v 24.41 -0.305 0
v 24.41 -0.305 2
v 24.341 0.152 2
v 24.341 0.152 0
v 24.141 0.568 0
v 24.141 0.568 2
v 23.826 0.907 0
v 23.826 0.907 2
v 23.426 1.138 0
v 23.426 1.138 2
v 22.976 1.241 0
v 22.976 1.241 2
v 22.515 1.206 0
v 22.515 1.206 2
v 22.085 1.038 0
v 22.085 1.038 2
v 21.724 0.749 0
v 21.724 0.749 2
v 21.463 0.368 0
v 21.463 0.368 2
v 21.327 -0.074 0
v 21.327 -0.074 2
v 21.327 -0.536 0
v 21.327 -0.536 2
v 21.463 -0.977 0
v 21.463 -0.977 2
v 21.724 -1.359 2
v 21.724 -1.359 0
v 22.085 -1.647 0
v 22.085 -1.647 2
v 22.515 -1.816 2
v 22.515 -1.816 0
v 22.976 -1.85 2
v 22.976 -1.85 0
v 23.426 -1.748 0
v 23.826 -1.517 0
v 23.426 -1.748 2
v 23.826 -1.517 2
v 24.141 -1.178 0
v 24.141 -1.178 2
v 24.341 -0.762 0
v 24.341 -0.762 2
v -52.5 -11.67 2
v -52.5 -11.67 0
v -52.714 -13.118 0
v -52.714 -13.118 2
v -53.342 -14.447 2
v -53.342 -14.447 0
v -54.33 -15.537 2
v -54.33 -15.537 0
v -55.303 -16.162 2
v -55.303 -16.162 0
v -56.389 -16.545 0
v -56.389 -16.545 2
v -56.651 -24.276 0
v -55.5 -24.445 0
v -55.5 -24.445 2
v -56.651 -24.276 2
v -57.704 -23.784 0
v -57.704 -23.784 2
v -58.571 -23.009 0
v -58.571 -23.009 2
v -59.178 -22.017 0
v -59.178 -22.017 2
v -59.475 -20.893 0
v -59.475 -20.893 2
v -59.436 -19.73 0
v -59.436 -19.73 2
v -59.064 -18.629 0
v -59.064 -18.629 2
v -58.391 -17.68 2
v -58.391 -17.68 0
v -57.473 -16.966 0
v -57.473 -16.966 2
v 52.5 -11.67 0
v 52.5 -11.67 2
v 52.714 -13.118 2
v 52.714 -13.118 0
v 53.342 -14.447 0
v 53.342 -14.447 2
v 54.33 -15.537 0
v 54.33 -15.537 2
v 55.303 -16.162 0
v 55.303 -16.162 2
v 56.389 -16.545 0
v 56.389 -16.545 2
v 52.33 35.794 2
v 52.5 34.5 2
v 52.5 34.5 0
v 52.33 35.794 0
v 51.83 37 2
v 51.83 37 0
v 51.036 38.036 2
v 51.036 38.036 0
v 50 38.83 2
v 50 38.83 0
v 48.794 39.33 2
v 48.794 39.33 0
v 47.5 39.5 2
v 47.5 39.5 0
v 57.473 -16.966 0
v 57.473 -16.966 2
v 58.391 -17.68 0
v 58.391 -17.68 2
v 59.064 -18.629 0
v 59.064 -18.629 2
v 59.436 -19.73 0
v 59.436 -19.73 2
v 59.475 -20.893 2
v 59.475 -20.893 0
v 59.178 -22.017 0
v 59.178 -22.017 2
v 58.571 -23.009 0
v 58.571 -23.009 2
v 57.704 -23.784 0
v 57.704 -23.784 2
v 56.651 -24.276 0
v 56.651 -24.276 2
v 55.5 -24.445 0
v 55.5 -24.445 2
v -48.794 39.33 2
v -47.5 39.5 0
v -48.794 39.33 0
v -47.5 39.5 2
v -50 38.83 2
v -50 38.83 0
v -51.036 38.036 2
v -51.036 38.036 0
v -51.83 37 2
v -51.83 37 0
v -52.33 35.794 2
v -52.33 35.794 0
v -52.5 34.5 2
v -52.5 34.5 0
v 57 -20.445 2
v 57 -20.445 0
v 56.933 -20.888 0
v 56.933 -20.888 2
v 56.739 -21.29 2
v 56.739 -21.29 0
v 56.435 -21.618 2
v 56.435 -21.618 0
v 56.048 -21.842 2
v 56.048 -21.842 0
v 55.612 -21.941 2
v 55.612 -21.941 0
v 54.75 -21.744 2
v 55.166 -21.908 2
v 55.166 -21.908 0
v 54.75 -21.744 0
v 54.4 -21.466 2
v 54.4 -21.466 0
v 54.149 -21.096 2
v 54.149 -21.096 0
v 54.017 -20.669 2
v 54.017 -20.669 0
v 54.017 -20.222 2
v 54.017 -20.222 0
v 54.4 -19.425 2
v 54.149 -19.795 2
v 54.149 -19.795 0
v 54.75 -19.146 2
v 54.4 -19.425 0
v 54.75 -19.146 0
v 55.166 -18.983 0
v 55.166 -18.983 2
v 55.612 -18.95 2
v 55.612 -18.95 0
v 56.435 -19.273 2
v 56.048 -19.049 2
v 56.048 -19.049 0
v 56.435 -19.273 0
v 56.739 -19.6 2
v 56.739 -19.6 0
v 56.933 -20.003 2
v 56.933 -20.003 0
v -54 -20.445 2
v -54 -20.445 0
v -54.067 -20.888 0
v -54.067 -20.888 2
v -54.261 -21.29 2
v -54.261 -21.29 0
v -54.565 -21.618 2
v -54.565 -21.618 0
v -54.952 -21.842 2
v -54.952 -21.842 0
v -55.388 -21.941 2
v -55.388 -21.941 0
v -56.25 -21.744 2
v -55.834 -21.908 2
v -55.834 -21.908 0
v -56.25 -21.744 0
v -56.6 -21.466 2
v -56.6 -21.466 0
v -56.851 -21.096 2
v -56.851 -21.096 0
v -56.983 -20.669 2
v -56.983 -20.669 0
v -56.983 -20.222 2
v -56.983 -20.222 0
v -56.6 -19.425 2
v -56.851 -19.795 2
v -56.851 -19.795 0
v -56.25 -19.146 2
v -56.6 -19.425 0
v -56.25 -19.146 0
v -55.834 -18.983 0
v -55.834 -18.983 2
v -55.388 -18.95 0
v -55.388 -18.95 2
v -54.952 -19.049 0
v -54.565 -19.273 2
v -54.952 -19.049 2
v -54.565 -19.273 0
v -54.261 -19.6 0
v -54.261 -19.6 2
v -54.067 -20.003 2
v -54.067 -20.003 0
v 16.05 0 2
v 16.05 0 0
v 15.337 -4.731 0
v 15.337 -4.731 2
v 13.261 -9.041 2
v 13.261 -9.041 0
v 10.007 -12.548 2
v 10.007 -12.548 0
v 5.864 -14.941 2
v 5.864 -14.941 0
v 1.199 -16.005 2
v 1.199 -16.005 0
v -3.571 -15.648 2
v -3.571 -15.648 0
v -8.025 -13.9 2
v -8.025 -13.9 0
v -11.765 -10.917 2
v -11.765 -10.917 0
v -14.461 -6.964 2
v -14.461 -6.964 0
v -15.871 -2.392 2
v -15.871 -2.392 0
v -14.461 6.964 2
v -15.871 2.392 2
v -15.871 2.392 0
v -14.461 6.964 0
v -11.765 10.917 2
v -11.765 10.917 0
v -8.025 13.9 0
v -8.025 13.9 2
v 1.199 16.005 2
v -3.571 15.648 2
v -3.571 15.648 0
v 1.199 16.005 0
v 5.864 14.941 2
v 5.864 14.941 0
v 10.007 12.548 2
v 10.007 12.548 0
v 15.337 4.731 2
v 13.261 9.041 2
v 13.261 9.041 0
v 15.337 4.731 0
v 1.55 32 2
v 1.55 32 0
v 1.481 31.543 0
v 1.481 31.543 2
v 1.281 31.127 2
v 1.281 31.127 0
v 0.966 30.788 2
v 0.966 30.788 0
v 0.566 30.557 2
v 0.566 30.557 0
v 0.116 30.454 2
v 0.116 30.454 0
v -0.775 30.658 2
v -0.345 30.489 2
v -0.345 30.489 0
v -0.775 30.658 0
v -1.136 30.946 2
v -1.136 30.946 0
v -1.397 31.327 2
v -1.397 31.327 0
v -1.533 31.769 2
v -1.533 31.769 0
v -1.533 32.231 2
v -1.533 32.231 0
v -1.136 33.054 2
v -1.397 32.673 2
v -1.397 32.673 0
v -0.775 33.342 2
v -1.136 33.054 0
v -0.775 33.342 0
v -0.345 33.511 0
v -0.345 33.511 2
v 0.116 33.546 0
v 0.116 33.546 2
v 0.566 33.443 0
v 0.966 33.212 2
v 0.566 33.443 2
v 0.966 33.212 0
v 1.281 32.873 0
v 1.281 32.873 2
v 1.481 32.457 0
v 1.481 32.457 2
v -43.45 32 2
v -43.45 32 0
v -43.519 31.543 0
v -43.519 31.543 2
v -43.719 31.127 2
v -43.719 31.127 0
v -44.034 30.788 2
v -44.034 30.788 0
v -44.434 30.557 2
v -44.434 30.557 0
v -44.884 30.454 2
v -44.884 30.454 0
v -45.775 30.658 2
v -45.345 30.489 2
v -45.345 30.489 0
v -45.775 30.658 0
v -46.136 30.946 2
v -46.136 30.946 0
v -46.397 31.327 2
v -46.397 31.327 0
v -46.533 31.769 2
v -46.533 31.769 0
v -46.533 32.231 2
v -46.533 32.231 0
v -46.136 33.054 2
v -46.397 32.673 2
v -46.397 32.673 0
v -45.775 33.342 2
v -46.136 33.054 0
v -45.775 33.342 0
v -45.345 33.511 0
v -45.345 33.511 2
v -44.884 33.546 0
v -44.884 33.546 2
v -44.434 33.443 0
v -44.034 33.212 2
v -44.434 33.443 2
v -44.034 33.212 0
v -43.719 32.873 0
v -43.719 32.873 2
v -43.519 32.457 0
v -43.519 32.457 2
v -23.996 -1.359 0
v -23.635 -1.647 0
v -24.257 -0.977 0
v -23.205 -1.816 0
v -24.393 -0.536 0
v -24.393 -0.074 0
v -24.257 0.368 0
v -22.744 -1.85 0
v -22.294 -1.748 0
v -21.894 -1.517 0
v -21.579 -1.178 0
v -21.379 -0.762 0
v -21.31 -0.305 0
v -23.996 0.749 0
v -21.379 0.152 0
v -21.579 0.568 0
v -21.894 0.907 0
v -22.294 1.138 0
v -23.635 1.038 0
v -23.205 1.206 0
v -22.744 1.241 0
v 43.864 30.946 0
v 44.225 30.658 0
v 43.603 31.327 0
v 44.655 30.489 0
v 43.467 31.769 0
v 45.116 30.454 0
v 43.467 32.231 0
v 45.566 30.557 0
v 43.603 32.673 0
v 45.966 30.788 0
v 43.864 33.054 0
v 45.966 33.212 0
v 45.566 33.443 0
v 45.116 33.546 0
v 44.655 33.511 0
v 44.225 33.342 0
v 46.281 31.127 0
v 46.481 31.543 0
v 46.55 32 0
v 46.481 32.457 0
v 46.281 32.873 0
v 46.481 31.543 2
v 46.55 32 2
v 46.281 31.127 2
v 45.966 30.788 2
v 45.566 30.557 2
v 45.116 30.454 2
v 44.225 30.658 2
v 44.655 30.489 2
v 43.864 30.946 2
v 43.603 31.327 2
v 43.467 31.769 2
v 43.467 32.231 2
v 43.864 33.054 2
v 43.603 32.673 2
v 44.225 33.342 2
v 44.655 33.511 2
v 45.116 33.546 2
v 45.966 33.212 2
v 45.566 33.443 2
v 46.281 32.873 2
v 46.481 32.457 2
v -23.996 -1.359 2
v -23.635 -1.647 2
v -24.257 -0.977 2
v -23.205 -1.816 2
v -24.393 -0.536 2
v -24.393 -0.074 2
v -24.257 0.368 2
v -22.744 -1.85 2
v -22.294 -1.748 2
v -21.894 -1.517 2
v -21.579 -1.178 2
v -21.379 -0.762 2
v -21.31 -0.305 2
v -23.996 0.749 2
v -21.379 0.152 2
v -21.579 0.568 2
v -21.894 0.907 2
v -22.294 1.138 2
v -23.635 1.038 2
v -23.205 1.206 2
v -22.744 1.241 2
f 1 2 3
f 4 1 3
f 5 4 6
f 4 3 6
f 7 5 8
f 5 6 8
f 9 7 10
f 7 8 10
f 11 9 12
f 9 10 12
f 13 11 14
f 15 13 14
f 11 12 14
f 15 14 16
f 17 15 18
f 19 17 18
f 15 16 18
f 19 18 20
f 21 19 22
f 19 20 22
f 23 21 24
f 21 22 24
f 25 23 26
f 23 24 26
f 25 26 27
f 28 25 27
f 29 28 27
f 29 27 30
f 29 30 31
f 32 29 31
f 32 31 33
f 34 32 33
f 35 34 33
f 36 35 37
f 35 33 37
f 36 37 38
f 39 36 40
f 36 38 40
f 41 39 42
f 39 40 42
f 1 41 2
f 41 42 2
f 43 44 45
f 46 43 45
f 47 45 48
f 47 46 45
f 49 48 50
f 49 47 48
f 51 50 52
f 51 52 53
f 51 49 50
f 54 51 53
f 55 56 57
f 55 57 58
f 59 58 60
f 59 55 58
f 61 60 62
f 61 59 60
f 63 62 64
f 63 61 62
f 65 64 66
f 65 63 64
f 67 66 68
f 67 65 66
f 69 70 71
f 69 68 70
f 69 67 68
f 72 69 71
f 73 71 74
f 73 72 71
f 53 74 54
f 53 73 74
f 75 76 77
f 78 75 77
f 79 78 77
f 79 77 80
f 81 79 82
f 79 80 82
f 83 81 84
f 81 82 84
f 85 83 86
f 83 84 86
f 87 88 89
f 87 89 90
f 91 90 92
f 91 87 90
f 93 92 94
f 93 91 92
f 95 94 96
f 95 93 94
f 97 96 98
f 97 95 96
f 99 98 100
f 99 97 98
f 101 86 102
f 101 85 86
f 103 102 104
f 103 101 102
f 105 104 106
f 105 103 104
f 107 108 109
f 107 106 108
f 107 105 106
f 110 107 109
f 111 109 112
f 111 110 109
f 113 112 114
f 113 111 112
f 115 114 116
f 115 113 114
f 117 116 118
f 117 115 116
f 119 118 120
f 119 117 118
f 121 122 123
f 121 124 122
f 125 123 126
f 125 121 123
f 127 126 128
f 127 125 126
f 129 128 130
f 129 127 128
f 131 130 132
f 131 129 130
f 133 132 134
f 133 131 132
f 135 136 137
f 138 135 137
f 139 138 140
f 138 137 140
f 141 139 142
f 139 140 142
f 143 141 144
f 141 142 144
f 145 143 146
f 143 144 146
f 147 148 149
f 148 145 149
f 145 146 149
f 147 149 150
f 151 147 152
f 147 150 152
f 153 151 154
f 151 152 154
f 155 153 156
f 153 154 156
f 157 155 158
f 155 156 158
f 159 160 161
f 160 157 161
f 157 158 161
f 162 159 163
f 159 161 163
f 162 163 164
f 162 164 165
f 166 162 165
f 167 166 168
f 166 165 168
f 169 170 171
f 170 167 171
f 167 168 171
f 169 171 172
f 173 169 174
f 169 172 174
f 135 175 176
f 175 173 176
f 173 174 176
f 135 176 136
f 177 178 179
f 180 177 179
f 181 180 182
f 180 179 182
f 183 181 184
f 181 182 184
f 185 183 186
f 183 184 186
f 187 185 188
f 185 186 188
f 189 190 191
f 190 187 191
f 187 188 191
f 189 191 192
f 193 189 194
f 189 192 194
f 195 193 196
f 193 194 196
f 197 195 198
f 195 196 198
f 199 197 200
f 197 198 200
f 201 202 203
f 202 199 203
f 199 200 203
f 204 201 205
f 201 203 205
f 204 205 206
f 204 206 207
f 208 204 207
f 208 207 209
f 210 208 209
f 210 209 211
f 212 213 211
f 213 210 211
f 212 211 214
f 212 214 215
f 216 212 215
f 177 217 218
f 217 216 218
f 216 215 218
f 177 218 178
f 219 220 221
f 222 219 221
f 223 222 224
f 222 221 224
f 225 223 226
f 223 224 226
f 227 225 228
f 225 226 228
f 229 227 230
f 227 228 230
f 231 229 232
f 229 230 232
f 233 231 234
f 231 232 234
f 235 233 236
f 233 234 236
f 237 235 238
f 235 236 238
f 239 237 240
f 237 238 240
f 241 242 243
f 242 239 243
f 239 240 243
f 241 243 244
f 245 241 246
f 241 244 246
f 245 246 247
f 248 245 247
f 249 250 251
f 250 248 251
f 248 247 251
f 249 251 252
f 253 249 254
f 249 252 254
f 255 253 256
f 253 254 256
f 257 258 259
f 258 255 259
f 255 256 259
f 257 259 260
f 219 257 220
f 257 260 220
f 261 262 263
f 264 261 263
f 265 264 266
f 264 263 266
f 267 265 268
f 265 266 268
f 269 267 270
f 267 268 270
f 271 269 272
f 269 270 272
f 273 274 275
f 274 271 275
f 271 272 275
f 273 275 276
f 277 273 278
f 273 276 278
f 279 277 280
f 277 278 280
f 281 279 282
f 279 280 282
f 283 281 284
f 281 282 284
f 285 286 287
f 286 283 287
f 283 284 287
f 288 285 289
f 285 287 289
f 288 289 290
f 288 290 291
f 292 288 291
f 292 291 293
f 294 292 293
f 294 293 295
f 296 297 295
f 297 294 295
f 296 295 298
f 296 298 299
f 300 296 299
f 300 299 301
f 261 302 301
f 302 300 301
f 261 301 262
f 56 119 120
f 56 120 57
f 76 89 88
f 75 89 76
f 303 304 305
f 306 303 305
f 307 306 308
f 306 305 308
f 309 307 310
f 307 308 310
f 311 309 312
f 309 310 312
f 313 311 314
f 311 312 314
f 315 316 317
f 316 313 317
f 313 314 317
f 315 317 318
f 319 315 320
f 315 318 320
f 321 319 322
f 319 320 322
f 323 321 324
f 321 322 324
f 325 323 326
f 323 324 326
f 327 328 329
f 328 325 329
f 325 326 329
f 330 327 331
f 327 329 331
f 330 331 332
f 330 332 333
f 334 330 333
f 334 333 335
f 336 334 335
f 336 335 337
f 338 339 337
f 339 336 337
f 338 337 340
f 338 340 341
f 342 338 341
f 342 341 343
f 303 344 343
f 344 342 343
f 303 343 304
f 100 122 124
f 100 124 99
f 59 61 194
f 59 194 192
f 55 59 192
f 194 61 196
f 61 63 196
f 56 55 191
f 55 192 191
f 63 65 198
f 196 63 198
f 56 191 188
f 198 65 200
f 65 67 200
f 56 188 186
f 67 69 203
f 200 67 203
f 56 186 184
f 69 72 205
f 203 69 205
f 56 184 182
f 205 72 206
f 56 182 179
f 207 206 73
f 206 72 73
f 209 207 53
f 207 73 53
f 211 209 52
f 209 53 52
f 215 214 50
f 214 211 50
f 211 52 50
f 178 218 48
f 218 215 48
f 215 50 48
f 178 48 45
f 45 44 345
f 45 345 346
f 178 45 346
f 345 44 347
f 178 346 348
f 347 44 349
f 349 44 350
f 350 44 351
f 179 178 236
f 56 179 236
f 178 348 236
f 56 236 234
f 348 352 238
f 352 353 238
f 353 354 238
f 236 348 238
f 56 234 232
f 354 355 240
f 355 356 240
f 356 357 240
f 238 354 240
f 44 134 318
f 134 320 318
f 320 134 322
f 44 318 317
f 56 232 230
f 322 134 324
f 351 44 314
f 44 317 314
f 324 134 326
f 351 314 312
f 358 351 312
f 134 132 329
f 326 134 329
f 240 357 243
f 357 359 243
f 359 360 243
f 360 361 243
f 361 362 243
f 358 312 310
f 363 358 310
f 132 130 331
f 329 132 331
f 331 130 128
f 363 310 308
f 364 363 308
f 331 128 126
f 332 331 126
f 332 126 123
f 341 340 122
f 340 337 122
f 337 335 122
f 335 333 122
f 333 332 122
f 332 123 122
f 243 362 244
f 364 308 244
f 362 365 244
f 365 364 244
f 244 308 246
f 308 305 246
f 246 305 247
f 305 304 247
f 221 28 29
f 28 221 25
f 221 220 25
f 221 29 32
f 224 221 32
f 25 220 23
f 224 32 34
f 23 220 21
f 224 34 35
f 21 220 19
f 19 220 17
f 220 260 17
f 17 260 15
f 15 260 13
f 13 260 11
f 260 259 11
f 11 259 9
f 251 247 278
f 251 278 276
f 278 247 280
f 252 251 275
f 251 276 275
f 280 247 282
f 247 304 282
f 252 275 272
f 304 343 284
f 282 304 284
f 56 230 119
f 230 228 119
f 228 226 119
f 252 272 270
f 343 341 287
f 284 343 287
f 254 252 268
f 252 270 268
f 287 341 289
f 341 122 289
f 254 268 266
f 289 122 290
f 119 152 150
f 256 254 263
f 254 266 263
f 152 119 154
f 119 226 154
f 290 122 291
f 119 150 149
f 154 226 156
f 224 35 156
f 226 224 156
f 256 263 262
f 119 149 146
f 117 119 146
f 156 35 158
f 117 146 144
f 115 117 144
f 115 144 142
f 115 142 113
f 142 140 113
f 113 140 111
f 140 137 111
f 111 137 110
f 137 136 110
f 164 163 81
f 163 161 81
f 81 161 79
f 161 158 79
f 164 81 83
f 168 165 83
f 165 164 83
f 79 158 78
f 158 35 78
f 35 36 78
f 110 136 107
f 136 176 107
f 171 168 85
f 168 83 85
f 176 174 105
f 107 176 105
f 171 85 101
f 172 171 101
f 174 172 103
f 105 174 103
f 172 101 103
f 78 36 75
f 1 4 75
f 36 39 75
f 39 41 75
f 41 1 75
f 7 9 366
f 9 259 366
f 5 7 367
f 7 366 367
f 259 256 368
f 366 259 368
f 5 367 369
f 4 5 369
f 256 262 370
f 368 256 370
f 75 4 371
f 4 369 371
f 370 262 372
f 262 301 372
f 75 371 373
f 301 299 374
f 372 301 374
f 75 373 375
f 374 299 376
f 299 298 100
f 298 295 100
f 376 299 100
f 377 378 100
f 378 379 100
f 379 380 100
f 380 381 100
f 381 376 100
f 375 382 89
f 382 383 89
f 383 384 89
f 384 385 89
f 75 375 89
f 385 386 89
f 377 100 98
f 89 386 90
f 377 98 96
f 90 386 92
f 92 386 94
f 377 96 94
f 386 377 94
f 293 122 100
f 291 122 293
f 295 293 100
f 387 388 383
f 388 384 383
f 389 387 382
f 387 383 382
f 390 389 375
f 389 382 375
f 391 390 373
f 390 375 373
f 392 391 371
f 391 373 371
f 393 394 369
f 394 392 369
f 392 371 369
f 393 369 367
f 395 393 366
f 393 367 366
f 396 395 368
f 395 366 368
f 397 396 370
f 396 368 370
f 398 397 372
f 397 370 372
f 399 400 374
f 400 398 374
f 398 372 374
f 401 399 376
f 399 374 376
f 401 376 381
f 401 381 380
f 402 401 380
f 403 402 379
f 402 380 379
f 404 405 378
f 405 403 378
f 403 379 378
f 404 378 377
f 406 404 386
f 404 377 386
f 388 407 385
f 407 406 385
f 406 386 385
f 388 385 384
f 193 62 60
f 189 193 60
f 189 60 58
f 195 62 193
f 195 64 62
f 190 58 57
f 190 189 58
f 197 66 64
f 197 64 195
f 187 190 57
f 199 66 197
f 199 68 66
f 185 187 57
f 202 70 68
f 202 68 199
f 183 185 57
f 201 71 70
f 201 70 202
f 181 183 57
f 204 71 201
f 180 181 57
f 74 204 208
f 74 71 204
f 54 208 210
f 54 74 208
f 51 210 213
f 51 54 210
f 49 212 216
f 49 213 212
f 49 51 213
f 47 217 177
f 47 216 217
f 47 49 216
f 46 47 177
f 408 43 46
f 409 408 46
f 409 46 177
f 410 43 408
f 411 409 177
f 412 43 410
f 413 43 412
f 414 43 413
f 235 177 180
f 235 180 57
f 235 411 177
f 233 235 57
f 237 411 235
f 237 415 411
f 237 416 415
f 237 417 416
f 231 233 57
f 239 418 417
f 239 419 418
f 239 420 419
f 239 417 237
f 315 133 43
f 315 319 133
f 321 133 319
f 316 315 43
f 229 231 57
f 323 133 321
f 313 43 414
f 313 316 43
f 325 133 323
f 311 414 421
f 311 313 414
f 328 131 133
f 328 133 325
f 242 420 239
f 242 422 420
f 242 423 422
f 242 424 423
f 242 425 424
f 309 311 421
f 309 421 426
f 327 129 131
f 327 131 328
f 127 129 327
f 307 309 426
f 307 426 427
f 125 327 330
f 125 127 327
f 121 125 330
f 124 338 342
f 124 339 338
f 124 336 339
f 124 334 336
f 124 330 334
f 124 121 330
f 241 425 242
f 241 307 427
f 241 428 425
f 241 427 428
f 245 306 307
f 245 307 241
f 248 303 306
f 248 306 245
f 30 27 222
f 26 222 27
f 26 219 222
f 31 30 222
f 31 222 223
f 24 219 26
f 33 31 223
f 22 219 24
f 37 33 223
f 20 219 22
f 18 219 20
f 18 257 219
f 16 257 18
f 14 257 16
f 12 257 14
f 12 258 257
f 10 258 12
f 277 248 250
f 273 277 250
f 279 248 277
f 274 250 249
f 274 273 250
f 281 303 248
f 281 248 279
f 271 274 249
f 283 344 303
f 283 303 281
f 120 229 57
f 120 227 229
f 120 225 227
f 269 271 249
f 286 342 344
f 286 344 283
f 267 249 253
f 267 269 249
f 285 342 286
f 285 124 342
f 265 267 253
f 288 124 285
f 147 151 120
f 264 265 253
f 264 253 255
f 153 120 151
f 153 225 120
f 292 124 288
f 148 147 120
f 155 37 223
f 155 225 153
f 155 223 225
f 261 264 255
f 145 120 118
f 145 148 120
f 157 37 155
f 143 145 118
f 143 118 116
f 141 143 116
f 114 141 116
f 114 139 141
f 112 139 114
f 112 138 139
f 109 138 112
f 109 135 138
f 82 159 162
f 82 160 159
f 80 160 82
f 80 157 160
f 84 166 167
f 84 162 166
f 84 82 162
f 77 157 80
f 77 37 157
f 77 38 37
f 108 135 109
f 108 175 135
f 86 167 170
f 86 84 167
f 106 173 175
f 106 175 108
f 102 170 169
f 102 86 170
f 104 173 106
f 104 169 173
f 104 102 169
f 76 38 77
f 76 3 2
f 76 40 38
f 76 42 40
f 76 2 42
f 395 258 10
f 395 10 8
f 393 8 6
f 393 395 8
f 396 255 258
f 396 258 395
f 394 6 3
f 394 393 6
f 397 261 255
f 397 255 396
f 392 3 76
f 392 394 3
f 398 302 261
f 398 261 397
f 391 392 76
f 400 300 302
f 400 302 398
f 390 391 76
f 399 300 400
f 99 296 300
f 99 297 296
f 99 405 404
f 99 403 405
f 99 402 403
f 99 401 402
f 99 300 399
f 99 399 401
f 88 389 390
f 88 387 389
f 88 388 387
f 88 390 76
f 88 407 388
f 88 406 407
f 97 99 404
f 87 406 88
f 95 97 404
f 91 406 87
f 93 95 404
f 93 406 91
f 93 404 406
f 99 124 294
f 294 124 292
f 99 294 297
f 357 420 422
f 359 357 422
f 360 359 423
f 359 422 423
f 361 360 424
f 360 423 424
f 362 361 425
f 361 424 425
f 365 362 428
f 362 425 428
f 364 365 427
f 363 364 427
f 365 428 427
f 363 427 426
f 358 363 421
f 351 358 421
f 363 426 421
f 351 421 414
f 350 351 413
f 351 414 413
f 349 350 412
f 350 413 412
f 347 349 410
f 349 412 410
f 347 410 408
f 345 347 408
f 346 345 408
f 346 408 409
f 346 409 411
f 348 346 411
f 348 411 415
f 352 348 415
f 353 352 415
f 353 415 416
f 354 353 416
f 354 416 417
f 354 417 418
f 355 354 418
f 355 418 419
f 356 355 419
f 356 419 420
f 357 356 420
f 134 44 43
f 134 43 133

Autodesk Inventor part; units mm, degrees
ref_plane "YZ Plane" through (0, 0, 0) normal (1, 0, 0) x (0, 1, 0)
ref_plane "XZ Plane" through (0, 0, 0) normal (0, 1, 0) x (-1, 0, 0)
ref_plane "XY Plane" through (0, 0, 0) normal (0, 0, 1) x (1, 0, 0)
sketch "スケッチ1" plane through (0, 0, 0) normal (0, 0, 1) x (1, 0, 0)
  circle A0 centre (0, 0) radius 52.5 construction
  circle A1 centre (0, 0) radius 12.55 construction
  circle A2 centre (-12.3744, 12.3744) radius 2.05 construction
  circle A3 centre (-12.3744, -12.3744) radius 2.05 construction
  circle A4 centre (12.3744, -12.3744) radius 2.05 construction
  circle A5 centre (12.3744, 12.3744) radius 2.05 construction
  line L0 (0, 0) -> (-12.3744, 12.3744) construction
  line L1 (0, 0) -> (0, 12.55) construction
  circle A6 centre (0, 0) radius 23.5 construction
  line L2 (-52.5, 39.5) -> (52.5, 39.5)
  line L3 (52.5, 39.5) -> (52.5, -24.4454)
  line L4 (52.5, -24.4454) -> (-52.5, -24.4454)
  line L5 (-52.5, -24.4454) -> (-52.5, 39.5)
  line L6 (-52.5, 24.5) -> (52.5, 24.5) construction
  line L7 (-52.5, 32) -> (52.5, 32) construction
  circle A7 centre (0, 32) radius 1.55
  circle A8 centre (-45, 32) radius 1.55
  circle A9 centre (45, 32) radius 1.55
  circle A10 centre (-19.4454, 19.4454) radius 1.55 construction
  circle A11 centre (-19.4454, -19.4454) radius 1.55 construction
  circle A12 centre (19.4454, -19.4454) radius 1.55 construction
  circle A13 centre (19.4454, 19.4454) radius 1.55 construction
  circle A14 centre (0, 0) radius 16.05
  circle A15 centre (-55.5, -20.4454) radius 1.5
  line L8 (-52.5, -24.4454) -> (-55.5, -24.4454)
  arc A16 (-55.5, -16.4454) -> (-55.5, -24.4454) centre (-55.5, -20.4454) ccw
  line L9 (-55.5, -16.4454) -> (-52.5, -16.4454)
  circle A17 centre (55.5, -20.4454) radius 1.5
  line L10 (52.5, -24.4454) -> (55.5, -24.4454)
  arc A18 (55.5, -24.4454) -> (55.5, -16.4454) centre (55.5, -20.4454) ccw
  line L11 (55.5, -16.4454) -> (52.5, -16.4454)
  point P0 (0, 39.5)
  point P1 (0, 23.5)
  point P2 (0, -52.5)
  dimension "d0" = 105
  dimension "d1" = 25.1
  dimension "d9" = 47
  dimension "d2" = 4.1
  dimension "d5" = 360
  dimension "d7" = 45
  dimension "d8" = 35
  dimension "d10" = 15
  dimension "d18" = 105
  dimension "d20" = 7.5
  dimension "d21" = 3.1
  dimension "d22" = 3.1
  dimension "d23" = 3.1
  dimension "d24" = 90
  dimension "d27" = 3.1
  dimension "d30" = 360
  dimension "d32" = 55
  dimension "d33" = 32.1
  dimension "d41" = 5
  dimension "d42" = 3
  dimension "d43" = 4
  dimension "d44" = 3
  dimension "d45" = 92
extrude "押し出し1" add sketch "スケッチ1" along normal blind 2
sketch "スケッチ2" plane through (0, 0, 2) normal (0, 0, 1) x (1, 0, 0)
  line L0 (-22.86, -0.3048) -> (22.86, -0.3048) construction
  line L1 (0, -0.3048) -> (0, 0) construction
  circle A0 centre (-22.86, -0.3048) radius 1.55
  circle A1 centre (22.86, -0.3048) radius 1.55
  line L2 (0, 0) -> (0, 0.3048) construction
  dimension "d34" = 0.3048
  dimension "d35" = 45.72
  dimension "d36" = 3.1
  dimension "d37" = 3.1
  dimension "d40" = 0.3048
extrude "押し出し2" cut sketch "スケッチ2" against normal through all
fillet "フィレット1" radius 5 4 edges at (-52.5, -16.4454, 1) (-52.5, 39.5, 1) (52.5, 39.5, 1) (52.5, -16.4454, 1)
sketch "スケッチ3" plane through (0, 0, 2) normal (0, 0, 1) x (1, 0, 0)
  arc A0 (52.5, 34.5) -> (47.5, 39.5) centre (47.5, 34.5) ccw projected
  line L0 (47.5, 39.5) -> (-47.5, 39.5) projected
  arc A1 (-47.5, 39.5) -> (-52.5, 34.5) centre (-47.5, 34.5) ccw projected
  line L1 (-52.5, 34.5) -> (-52.5, -11.6705) projected
  arc A2 (-56.3889, -16.5455) -> (-52.5, -11.6705) centre (-57.5, -11.6705) ccw projected
  arc A3 (-56.3889, -16.5455) -> (-55.5, -24.4454) centre (-55.5, -20.4454) ccw projected
  line L2 (-55.5, -24.4454) -> (55.5, -24.4454) projected
  arc A4 (55.5, -24.4454) -> (56.3889, -16.5455) centre (55.5, -20.4454) ccw projected
  arc A5 (52.5, -11.6705) -> (56.3889, -16.5455) centre (57.5, -11.6705) ccw projected
  line L3 (52.5, -11.6705) -> (52.5, 34.5) projected
  circle A6 centre (22.86, -0.3048) radius 1.55 projected
  circle A7 centre (-22.86, -0.3048) radius 1.55 projected
  circle A8 centre (0, 32) radius 1.55 projected
  circle A9 centre (-45, 32) radius 1.55 projected
  circle A10 centre (45, 32) radius 1.55 projected
  circle A11 centre (0, 0) radius 16.05 projected
  circle A12 centre (55.5, -20.4454) radius 1.5 projected
  circle A13 centre (-55.5, -20.4454) radius 1.5 projected
equation "\"d20\" = 0.5 * d10"
equation "\"d40\" = d34"
properties part number "omu_al_jo_3" material "アルミニウム 6061-AHC"
